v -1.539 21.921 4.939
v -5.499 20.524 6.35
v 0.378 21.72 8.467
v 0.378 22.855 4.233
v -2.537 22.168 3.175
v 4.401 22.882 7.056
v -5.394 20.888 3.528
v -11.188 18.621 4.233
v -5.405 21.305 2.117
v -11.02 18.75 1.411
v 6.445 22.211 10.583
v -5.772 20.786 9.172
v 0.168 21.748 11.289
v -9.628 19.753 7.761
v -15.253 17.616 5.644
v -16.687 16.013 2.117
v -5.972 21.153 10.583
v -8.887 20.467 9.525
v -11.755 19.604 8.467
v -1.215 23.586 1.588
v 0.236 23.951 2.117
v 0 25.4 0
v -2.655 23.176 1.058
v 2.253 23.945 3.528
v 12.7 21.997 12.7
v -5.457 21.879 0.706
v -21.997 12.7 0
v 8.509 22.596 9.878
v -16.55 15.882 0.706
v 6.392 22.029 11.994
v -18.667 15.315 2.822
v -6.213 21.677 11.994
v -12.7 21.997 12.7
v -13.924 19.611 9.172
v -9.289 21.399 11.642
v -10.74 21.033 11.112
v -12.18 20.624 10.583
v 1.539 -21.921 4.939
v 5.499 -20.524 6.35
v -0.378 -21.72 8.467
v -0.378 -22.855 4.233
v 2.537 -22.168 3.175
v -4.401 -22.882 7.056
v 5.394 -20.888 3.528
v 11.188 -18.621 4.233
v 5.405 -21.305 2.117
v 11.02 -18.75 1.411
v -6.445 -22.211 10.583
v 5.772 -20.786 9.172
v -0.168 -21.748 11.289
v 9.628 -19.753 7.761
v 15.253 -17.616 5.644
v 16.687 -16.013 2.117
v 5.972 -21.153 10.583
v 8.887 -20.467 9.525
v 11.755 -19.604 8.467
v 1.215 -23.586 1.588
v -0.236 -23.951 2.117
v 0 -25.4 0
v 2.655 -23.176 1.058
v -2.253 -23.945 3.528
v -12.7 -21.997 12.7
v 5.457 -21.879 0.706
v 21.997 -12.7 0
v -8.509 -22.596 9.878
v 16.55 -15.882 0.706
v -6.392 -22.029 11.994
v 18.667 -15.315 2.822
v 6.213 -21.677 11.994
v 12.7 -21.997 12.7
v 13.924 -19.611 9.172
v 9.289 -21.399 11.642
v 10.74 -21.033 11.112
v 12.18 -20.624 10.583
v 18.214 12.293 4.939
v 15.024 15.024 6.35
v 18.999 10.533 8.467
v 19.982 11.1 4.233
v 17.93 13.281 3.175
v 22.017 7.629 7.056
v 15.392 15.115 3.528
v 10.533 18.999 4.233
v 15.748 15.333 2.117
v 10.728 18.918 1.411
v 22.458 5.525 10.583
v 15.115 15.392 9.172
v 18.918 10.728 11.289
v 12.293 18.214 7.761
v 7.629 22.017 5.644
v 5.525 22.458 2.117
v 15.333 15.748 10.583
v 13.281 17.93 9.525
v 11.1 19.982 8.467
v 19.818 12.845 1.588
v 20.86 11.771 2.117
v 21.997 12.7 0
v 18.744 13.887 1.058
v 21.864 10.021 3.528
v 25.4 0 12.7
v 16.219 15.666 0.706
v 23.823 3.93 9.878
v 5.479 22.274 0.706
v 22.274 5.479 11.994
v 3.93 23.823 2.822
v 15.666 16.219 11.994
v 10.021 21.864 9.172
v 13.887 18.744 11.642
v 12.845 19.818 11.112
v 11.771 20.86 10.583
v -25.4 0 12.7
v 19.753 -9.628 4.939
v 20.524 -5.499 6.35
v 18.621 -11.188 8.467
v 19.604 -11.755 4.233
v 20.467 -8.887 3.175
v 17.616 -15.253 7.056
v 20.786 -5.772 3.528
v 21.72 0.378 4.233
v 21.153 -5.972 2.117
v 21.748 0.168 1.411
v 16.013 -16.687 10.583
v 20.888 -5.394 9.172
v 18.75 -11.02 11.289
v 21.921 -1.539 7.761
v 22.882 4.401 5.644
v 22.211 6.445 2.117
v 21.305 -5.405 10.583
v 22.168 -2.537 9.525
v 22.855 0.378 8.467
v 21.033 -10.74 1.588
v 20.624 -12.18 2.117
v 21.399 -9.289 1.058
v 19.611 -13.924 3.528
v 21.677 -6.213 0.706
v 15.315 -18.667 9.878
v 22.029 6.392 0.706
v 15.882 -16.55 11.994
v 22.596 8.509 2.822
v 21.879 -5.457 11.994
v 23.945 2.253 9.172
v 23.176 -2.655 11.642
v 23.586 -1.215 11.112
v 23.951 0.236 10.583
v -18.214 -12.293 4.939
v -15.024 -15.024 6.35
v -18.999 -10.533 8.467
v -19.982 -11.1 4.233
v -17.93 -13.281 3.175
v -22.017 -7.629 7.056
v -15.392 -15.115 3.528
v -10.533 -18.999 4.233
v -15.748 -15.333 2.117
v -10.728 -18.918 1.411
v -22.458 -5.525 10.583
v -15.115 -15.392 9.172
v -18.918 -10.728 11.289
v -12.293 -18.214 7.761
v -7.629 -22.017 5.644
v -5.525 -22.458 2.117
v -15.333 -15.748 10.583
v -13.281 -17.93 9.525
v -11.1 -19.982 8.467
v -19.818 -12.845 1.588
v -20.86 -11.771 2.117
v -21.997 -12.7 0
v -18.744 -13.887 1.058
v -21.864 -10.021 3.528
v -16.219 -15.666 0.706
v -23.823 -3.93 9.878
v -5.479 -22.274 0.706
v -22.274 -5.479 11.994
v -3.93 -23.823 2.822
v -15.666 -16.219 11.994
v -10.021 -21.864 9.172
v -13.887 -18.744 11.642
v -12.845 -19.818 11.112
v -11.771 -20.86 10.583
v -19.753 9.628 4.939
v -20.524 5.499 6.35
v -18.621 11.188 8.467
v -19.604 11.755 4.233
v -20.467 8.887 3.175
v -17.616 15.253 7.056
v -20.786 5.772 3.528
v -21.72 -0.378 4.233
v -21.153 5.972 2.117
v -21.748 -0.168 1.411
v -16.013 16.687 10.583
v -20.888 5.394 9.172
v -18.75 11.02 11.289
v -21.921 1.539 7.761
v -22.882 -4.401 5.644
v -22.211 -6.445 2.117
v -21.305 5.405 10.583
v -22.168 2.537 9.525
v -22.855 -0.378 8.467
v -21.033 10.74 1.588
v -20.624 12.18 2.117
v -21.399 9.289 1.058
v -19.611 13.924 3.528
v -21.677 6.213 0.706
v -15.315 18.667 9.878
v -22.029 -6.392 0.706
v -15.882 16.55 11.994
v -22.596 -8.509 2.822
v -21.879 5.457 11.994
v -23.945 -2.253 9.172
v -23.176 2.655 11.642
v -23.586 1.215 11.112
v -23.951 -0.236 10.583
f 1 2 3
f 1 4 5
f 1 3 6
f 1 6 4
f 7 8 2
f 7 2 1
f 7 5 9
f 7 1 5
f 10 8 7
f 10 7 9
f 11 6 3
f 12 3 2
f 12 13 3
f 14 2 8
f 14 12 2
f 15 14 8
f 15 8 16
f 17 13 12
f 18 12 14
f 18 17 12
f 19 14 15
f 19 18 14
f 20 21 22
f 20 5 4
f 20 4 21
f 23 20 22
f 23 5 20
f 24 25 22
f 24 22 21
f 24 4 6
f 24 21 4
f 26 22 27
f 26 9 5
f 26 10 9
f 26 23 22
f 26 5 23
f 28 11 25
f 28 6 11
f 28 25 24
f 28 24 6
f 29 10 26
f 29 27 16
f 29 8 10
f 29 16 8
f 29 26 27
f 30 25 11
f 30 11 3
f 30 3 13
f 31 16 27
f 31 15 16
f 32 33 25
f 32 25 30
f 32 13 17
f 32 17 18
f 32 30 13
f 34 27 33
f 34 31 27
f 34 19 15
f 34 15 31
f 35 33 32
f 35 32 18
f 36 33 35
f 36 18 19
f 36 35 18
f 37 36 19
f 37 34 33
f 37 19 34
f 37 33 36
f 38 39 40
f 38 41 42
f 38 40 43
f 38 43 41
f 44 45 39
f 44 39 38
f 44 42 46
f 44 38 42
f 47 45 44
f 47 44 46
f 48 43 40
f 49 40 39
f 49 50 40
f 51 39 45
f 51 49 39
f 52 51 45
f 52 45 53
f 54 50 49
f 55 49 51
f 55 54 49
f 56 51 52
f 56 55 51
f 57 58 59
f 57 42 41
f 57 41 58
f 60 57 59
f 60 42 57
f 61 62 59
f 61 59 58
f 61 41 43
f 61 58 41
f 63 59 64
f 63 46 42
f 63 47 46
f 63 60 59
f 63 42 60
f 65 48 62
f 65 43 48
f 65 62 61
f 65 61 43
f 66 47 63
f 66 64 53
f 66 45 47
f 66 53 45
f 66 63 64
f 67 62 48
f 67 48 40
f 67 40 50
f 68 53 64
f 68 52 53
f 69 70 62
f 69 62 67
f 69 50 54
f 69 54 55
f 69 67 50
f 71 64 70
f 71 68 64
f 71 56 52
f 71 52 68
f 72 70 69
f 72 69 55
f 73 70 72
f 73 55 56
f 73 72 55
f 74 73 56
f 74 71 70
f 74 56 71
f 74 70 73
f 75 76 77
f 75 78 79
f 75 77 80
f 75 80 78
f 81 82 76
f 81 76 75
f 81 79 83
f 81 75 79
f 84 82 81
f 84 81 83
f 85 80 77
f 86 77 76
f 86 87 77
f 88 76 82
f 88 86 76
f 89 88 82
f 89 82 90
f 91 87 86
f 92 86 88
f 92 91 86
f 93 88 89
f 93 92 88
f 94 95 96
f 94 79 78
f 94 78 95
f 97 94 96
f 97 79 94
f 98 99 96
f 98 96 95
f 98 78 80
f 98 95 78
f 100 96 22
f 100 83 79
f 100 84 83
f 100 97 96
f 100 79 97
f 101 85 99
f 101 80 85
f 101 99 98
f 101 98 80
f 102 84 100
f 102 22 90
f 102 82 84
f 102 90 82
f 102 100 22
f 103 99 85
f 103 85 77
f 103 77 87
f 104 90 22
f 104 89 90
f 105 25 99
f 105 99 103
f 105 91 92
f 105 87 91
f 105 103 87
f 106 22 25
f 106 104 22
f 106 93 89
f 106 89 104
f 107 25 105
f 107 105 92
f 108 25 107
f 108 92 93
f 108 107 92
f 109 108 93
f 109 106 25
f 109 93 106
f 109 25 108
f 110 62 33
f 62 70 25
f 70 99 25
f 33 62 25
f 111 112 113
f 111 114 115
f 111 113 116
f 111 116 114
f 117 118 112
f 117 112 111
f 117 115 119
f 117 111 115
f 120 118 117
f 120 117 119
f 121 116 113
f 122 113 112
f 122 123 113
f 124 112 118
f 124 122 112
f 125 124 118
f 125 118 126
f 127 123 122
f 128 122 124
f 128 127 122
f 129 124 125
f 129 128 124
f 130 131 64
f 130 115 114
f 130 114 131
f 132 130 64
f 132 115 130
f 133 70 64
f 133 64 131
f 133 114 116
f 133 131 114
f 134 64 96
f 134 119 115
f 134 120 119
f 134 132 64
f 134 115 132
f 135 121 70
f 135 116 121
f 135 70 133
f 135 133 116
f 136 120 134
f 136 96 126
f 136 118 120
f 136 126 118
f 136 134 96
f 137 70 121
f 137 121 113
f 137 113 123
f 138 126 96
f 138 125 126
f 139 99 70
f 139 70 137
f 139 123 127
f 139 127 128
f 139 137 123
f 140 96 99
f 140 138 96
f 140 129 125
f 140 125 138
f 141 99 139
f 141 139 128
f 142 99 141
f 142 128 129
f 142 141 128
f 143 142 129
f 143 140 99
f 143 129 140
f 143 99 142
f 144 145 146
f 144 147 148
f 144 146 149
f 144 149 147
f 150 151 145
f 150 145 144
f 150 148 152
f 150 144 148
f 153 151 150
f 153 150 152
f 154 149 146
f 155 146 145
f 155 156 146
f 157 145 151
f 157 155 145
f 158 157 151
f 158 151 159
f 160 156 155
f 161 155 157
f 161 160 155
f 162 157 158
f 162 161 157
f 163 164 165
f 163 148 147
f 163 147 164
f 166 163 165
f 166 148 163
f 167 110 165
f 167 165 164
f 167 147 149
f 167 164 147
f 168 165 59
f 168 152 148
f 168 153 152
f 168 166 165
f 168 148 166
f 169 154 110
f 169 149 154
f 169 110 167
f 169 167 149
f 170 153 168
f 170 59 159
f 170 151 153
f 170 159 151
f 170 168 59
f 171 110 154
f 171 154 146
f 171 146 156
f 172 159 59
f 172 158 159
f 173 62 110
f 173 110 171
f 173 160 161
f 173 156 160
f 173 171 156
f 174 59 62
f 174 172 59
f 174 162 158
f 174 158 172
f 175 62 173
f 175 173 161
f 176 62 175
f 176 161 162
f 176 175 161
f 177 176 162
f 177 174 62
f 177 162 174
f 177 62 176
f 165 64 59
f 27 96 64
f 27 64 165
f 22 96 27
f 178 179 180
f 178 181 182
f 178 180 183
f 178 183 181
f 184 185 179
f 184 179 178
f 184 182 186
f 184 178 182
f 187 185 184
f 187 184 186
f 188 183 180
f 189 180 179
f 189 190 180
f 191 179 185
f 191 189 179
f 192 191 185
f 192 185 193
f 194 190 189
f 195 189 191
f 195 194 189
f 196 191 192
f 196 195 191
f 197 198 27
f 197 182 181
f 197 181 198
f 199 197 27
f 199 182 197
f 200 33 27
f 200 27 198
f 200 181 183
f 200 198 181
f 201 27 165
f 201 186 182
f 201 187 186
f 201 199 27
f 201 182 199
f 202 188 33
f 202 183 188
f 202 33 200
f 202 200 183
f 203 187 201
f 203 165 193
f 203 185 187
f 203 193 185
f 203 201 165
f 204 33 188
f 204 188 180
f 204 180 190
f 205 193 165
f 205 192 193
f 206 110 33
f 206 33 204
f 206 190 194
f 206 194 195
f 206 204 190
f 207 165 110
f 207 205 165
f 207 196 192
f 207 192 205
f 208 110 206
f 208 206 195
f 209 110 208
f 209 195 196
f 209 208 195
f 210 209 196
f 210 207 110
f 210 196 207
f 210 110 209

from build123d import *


with BuildPart() as f3:
    # F0 (on Top) → F3 section 0
    with BuildSketch(Plane.XY):
        Polygon((21.9970452561, -12.7), (21.9970452561, 12.7), (0, 25.4), (-21.9970452561, 12.7), (-21.9970452561, -12.7), (0, -25.4), align=None)
    # F2 (on offset) → F3 section 1
    with BuildSketch(Plane.XY.offset(12.7)):
        Polygon((-12.7, 21.9970452561), (-25.4, 0), (-12.7, -21.9970452561), (12.7, -21.9970452561), (25.4, 0), (12.7, 21.9970452561), align=None)
    loft()


solid = f3.part
